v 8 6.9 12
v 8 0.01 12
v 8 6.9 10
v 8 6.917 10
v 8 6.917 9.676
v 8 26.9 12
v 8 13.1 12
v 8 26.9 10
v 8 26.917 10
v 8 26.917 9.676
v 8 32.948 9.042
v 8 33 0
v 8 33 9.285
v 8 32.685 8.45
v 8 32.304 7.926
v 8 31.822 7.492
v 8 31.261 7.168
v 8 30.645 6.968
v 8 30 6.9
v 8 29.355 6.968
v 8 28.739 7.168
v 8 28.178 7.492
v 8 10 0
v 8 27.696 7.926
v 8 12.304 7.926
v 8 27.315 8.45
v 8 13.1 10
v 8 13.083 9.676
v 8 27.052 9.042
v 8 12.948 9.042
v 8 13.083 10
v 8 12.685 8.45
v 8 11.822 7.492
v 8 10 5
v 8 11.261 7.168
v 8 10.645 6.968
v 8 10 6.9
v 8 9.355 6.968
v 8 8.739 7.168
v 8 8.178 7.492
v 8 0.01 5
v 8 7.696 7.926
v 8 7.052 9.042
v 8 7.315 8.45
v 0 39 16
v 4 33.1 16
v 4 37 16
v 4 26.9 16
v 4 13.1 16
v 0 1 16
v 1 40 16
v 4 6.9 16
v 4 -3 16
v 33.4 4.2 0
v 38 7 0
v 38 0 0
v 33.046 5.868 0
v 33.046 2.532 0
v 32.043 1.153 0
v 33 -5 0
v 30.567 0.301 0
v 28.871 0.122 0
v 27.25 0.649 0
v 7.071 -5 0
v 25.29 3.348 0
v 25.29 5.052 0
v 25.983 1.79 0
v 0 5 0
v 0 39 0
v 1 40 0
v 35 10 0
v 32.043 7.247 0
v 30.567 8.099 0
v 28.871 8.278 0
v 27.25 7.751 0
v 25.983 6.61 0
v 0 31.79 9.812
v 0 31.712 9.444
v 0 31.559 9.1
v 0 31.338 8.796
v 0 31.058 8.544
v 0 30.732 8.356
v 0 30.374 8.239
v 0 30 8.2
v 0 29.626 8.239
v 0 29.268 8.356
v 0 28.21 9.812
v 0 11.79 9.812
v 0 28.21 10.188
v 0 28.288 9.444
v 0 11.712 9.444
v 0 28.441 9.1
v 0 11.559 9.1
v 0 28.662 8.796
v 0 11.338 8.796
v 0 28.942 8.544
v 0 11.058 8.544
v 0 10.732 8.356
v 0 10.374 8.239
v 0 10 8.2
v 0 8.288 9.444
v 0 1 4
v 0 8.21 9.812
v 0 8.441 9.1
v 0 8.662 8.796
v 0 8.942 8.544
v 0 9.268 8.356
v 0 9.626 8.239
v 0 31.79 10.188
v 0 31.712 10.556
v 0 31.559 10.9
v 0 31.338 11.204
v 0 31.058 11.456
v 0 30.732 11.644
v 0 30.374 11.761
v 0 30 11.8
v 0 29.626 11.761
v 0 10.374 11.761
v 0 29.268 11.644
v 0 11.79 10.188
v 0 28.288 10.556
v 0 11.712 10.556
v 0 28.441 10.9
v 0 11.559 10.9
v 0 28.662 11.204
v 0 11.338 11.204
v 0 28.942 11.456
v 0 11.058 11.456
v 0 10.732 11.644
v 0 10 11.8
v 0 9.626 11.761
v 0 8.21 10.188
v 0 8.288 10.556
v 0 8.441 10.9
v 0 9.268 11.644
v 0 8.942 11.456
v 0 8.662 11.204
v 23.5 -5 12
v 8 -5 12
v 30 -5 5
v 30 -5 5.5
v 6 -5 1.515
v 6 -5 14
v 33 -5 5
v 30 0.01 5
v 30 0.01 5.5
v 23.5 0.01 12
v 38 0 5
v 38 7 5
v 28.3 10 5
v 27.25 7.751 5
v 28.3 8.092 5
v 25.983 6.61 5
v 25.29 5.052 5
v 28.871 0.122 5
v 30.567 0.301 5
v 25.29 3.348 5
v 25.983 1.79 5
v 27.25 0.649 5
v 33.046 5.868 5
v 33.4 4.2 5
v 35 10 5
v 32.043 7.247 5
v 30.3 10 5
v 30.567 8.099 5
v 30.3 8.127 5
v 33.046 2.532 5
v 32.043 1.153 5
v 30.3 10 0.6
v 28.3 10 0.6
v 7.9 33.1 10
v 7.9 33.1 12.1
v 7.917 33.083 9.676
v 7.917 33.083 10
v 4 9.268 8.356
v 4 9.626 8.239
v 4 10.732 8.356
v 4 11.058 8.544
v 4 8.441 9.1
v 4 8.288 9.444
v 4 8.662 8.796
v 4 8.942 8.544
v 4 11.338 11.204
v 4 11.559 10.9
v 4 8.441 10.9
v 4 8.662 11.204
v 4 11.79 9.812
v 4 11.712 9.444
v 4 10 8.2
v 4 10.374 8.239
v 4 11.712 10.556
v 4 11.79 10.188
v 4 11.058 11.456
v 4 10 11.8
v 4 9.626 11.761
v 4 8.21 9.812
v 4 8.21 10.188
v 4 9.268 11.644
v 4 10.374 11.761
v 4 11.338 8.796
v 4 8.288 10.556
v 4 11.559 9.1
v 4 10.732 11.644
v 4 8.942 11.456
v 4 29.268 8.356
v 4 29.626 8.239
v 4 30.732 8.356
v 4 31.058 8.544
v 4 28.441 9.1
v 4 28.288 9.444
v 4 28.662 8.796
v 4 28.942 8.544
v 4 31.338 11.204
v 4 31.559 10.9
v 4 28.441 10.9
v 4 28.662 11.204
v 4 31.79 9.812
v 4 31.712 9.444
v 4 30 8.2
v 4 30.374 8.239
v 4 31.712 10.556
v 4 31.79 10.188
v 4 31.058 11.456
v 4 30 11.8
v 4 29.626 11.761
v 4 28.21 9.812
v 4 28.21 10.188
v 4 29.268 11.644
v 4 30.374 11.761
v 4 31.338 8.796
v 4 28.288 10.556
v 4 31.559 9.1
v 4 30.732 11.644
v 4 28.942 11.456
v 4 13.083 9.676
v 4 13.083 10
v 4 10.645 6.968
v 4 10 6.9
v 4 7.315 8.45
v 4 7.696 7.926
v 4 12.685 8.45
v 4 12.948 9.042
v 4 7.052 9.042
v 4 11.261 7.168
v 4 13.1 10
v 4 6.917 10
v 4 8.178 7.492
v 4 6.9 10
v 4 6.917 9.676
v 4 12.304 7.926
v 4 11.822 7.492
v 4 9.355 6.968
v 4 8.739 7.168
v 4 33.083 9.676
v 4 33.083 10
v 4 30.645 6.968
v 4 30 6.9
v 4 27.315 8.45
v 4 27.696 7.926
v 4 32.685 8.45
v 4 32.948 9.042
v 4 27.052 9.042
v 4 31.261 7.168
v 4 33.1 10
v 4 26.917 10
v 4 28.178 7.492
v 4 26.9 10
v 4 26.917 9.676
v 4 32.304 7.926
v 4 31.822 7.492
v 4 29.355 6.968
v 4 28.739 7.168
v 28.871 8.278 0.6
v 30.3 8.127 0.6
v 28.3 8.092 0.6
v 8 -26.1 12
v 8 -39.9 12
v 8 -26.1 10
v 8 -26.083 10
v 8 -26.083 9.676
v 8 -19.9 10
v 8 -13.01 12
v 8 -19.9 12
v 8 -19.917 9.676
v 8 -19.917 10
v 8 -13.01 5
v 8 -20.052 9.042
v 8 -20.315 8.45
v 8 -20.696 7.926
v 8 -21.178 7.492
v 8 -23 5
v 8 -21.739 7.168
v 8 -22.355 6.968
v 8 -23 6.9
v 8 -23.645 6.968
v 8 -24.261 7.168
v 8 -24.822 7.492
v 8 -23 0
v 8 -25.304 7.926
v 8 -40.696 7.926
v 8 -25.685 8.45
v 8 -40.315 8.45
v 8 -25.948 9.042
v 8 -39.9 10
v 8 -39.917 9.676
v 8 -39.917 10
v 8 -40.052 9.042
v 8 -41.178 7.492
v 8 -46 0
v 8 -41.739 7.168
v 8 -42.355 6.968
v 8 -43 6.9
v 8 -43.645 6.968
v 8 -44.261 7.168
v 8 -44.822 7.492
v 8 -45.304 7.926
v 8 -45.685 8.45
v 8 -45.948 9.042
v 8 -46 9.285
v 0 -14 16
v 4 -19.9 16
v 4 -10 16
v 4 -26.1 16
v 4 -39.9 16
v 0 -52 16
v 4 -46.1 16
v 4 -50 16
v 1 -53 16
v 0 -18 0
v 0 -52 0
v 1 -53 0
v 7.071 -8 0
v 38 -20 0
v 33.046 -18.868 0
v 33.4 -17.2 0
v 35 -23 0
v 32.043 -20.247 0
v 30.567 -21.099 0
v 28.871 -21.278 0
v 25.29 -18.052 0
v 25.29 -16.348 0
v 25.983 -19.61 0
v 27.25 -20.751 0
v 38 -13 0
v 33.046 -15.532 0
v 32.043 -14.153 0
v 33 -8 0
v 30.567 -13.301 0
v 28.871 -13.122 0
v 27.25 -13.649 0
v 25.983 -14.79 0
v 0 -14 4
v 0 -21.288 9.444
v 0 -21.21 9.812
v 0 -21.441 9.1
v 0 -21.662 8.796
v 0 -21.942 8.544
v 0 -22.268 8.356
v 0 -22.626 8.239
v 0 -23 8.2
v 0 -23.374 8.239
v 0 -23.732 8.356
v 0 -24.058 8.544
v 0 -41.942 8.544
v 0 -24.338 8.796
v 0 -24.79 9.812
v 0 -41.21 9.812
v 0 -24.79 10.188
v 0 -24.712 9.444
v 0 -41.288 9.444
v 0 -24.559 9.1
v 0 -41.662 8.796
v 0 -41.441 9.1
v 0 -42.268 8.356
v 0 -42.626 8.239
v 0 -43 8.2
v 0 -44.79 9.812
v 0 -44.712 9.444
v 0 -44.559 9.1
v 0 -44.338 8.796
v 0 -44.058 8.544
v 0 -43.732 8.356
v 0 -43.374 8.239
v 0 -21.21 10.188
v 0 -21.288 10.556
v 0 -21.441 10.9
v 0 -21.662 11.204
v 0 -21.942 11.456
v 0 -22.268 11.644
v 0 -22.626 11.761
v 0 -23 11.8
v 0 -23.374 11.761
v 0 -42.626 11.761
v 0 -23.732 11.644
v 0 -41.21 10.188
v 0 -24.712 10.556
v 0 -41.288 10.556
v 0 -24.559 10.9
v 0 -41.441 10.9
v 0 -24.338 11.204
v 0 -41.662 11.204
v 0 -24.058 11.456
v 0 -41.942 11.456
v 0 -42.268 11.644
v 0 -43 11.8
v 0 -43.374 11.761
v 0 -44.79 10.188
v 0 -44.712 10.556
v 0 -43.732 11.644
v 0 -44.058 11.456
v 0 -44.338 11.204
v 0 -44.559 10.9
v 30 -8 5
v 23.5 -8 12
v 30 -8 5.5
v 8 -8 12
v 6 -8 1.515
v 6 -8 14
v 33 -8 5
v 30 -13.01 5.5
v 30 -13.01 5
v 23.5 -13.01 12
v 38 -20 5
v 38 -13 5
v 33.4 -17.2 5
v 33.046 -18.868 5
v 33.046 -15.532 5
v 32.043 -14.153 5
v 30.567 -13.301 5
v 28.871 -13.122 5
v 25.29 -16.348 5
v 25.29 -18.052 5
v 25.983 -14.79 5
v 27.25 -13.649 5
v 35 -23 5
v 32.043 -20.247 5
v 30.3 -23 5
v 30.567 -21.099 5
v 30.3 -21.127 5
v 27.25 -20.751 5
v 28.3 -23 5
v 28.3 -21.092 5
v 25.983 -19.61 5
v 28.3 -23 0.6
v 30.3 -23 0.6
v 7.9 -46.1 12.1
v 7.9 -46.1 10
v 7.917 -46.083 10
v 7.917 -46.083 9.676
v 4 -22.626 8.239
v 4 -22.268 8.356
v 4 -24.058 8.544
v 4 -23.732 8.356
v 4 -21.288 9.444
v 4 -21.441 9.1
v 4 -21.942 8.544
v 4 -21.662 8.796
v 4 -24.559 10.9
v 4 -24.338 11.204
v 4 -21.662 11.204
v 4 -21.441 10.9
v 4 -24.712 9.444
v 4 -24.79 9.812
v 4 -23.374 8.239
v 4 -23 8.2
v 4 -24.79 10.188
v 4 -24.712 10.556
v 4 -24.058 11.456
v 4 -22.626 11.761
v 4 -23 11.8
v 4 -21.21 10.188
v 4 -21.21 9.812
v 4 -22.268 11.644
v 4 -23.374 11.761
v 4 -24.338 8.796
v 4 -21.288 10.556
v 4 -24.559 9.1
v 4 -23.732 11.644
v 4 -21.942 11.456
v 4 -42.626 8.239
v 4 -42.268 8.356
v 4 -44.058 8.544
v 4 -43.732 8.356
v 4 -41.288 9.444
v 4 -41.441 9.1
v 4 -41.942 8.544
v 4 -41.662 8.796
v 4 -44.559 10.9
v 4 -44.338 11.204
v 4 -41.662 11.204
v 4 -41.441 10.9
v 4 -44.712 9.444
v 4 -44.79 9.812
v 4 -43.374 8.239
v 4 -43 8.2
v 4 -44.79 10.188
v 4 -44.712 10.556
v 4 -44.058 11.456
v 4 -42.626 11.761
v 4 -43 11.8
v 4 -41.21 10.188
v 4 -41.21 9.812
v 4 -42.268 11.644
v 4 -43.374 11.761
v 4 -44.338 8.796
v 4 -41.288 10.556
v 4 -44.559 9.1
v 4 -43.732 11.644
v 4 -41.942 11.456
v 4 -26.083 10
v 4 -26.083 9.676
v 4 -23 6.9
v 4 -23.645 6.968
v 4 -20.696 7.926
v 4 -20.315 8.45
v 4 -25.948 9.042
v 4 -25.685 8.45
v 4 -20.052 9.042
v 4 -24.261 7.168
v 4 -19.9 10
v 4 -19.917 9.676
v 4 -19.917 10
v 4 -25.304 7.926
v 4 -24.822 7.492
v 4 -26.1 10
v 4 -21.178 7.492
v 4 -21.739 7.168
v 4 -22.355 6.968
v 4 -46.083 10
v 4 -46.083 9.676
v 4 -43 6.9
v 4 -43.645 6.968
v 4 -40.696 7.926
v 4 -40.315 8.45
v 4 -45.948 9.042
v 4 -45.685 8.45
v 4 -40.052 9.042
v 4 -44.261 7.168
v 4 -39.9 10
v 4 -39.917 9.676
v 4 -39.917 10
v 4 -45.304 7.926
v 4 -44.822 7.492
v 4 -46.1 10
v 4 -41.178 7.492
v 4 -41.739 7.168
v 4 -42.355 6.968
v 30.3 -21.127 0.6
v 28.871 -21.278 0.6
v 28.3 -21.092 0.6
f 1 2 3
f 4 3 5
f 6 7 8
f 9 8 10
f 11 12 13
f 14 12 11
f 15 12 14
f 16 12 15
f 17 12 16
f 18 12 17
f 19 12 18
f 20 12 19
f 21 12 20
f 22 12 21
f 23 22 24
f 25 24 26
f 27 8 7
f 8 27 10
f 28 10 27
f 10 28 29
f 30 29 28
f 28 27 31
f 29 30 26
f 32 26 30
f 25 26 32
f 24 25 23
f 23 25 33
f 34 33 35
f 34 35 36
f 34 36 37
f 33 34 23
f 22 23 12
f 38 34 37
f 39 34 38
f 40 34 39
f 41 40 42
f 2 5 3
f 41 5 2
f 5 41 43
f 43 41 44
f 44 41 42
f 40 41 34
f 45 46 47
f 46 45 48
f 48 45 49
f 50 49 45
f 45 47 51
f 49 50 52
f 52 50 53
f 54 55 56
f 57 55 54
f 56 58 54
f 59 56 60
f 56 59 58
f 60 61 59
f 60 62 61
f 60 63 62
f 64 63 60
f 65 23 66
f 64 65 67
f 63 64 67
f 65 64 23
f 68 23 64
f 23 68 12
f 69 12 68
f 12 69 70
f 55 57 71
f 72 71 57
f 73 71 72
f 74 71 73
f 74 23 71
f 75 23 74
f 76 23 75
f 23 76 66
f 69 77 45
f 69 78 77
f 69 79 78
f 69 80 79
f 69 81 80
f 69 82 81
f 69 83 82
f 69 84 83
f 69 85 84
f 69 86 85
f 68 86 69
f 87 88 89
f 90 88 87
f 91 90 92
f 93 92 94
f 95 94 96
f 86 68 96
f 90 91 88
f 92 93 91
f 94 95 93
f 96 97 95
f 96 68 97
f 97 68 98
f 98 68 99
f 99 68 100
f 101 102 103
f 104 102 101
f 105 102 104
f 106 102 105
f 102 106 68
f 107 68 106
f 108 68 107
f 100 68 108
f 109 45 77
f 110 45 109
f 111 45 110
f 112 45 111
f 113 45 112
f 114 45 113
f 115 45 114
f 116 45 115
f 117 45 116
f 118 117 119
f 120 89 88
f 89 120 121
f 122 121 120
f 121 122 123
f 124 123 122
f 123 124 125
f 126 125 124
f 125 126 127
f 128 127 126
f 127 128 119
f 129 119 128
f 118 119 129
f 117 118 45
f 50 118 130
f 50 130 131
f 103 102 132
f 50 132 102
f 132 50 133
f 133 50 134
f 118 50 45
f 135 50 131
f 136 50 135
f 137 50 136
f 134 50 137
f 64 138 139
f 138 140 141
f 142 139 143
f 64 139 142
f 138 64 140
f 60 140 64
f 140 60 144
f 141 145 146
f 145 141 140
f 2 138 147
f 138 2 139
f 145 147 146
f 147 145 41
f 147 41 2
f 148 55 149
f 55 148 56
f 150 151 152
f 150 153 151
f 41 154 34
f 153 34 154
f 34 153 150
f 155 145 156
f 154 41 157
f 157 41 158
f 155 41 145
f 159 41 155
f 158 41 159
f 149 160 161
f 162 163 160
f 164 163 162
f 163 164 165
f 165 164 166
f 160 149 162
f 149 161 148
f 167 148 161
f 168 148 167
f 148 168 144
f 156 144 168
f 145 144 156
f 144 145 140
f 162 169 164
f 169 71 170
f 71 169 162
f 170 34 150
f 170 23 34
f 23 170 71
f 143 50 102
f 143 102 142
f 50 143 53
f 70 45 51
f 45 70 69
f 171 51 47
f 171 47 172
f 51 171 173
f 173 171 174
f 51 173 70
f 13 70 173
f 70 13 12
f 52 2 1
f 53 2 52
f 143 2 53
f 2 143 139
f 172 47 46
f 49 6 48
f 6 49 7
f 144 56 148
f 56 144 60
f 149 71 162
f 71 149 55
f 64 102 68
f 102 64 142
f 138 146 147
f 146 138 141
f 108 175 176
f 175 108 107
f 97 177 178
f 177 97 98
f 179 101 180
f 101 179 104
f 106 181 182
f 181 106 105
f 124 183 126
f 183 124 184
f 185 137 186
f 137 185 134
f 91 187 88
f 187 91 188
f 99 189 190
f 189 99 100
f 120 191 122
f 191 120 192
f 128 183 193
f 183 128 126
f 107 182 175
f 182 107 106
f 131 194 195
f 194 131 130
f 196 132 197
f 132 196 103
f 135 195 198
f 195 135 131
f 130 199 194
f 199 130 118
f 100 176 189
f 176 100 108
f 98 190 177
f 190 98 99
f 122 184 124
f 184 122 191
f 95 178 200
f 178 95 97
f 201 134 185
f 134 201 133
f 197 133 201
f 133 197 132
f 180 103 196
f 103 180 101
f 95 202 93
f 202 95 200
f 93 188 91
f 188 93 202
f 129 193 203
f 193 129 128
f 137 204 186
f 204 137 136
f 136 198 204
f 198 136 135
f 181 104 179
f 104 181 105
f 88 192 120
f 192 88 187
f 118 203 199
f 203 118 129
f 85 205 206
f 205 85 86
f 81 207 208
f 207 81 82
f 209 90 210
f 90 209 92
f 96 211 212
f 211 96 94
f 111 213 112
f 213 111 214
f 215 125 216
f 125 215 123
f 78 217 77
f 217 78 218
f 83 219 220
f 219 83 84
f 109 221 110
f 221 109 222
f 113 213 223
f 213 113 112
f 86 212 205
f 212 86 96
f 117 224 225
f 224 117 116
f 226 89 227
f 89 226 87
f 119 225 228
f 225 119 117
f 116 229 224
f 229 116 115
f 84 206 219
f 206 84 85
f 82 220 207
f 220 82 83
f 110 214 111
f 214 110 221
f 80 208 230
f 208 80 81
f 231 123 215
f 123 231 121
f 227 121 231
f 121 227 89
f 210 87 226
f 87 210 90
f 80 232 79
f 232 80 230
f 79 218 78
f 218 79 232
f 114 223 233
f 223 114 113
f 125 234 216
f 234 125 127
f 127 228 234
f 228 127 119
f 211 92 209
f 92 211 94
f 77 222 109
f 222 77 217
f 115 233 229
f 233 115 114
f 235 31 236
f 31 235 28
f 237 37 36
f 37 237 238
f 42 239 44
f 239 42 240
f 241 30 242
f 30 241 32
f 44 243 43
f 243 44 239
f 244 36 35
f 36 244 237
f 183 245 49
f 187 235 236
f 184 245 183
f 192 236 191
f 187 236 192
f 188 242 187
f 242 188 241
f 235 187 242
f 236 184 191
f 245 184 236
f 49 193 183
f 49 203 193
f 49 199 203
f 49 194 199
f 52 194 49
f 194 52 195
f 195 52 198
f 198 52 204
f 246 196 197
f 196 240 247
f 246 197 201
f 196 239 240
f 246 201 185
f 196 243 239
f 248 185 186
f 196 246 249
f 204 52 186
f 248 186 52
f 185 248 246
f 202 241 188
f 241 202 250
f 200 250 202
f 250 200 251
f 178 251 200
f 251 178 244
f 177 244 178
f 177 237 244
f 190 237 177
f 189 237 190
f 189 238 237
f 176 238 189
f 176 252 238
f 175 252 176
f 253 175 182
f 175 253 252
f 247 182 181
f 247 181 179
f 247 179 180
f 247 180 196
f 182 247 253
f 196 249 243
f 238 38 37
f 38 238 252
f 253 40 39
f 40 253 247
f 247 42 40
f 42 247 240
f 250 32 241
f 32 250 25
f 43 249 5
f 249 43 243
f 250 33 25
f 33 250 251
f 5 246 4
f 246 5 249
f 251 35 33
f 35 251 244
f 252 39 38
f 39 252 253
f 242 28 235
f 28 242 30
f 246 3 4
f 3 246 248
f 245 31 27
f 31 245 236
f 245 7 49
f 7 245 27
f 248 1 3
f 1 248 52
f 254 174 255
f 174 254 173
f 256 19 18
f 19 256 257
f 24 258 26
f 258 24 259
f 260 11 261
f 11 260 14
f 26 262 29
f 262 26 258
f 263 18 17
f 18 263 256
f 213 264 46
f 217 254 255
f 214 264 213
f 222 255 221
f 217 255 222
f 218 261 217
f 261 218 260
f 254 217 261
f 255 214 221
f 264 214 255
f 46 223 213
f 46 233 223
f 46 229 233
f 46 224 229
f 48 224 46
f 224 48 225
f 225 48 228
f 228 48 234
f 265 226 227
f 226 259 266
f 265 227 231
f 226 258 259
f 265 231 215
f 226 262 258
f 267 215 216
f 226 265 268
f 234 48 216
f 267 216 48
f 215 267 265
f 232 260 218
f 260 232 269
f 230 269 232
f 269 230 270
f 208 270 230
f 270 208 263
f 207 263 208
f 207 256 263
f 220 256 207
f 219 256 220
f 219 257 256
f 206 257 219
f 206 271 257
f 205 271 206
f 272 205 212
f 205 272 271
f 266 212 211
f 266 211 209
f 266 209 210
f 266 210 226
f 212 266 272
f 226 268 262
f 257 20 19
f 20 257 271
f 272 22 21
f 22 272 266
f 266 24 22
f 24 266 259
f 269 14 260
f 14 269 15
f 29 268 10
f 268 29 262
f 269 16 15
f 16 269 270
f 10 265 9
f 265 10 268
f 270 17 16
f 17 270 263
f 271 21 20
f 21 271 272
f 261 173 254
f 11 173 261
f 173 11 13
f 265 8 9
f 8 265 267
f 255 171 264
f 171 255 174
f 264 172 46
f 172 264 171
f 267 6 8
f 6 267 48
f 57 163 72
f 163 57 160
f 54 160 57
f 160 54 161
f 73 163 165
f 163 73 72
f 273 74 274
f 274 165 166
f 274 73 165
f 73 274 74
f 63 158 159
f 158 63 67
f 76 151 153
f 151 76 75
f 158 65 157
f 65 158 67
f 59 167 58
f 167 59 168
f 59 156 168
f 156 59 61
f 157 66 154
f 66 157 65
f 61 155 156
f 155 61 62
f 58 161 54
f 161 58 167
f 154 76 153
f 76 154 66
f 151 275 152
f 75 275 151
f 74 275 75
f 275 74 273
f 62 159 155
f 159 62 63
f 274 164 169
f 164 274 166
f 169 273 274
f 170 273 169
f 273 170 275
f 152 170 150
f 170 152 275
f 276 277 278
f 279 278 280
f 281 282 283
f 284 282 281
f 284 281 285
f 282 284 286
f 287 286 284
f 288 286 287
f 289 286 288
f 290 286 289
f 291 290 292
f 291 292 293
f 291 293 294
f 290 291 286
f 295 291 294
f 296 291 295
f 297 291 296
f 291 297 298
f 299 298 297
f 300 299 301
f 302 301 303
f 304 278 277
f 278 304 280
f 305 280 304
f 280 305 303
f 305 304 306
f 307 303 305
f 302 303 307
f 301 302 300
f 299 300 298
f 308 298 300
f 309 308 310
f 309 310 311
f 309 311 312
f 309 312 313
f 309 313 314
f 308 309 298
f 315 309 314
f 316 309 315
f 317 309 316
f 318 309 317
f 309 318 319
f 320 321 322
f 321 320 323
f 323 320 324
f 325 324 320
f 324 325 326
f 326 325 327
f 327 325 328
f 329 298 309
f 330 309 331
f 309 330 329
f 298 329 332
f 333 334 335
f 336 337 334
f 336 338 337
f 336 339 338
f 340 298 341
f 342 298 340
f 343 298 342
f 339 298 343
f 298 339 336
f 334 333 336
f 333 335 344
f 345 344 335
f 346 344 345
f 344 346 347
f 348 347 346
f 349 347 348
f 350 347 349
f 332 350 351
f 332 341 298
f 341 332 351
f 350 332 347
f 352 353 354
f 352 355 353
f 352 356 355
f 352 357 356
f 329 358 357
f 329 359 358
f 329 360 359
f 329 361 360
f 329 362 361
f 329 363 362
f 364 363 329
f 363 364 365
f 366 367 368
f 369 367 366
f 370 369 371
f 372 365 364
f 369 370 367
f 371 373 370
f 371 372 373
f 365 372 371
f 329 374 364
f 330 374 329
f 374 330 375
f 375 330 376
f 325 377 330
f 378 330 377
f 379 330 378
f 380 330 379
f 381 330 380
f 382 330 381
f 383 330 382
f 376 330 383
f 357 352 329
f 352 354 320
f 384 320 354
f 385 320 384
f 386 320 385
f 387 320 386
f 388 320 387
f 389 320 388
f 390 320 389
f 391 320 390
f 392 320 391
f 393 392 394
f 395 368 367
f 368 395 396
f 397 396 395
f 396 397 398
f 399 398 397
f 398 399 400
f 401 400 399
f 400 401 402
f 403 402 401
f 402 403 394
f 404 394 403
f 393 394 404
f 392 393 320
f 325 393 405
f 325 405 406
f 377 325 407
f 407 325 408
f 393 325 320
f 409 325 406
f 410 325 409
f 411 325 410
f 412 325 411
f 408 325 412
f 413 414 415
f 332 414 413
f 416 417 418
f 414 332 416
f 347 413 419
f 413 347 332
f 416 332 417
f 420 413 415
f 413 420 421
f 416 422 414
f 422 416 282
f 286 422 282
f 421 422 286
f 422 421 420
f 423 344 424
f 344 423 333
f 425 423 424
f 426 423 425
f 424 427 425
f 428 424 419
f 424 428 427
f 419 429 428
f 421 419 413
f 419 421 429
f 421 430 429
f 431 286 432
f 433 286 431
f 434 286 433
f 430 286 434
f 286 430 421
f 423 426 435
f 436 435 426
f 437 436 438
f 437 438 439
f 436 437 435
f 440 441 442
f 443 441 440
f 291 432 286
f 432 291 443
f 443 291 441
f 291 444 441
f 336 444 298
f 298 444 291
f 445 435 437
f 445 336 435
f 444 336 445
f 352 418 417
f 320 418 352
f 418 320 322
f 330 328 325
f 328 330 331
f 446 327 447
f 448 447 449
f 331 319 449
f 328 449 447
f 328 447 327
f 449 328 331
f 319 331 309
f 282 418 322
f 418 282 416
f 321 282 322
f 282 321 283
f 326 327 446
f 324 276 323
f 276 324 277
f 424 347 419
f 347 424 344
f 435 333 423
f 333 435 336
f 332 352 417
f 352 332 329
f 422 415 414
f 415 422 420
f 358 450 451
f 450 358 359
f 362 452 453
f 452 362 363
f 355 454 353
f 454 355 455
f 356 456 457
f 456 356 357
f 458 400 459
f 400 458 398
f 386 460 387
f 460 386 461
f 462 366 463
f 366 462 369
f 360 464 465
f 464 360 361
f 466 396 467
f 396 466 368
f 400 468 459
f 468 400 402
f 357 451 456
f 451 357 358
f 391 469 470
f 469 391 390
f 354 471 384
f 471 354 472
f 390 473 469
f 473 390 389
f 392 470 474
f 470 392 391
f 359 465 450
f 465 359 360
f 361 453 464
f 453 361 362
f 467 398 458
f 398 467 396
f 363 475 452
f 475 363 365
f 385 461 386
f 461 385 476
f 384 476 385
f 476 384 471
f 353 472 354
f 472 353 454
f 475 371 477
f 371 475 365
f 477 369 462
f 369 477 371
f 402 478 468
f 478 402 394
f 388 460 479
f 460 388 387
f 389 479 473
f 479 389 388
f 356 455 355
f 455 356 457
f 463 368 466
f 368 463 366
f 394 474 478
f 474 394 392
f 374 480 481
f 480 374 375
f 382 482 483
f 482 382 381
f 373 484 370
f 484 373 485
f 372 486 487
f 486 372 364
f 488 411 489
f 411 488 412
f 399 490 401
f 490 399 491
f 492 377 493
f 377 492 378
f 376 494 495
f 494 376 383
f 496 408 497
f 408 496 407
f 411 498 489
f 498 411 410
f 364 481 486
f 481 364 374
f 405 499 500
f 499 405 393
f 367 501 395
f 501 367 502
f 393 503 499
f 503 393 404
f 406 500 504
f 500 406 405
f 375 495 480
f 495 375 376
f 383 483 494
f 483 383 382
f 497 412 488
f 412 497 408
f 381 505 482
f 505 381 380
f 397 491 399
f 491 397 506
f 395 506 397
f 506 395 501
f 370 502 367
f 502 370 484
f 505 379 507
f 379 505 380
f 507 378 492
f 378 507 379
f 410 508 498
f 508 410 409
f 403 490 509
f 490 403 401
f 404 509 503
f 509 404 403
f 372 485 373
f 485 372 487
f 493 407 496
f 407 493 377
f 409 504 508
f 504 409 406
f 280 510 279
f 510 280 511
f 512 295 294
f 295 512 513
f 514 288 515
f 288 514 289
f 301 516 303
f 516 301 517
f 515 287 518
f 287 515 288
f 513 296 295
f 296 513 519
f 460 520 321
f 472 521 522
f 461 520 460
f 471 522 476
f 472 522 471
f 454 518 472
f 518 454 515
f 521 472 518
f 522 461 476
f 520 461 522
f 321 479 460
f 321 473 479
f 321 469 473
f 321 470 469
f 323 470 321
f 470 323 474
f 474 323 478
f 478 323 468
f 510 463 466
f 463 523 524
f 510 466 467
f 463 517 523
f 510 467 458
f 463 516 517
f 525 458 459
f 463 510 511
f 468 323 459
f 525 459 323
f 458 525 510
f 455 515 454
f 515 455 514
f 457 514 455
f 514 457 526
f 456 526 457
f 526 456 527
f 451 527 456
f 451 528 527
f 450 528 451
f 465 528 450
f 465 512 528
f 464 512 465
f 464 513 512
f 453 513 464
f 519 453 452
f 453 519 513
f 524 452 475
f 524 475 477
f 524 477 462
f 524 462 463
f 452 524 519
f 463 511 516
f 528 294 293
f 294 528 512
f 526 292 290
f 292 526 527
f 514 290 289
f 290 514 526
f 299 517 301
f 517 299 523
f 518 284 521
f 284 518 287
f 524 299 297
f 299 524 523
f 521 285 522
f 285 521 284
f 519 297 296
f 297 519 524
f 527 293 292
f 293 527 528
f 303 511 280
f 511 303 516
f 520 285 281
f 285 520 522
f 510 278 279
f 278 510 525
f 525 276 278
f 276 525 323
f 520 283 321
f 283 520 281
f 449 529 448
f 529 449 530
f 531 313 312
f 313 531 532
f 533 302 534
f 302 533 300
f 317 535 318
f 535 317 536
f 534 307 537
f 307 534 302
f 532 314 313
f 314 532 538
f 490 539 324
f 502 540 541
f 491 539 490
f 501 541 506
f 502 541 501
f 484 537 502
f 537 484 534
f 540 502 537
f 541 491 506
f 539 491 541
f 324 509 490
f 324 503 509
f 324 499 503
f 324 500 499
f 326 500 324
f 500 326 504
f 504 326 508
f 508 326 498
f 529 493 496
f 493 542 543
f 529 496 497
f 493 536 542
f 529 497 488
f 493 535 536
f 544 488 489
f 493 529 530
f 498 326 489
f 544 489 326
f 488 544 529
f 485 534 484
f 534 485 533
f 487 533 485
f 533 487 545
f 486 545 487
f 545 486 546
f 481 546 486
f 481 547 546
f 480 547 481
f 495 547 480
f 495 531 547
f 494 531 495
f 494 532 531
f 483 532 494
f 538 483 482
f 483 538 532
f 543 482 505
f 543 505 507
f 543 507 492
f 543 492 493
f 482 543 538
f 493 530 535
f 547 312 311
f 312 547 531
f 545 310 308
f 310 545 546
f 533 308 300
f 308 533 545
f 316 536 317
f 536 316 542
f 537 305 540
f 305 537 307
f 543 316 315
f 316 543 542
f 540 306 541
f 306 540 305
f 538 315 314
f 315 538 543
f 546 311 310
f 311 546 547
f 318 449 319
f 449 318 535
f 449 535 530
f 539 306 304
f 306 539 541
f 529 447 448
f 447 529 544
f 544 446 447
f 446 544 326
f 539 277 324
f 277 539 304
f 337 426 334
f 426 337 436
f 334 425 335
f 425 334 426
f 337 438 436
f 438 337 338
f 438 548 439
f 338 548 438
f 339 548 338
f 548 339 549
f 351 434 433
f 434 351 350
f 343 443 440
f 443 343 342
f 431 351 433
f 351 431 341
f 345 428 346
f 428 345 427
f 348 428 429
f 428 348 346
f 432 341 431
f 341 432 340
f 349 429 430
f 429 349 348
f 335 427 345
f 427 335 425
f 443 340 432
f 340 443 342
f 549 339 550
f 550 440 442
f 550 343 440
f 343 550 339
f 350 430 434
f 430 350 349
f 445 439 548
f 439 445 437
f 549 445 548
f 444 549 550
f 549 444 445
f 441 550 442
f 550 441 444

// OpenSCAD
// PRUSA iteration3
// Z axis top holder
// GNU GPL v3
// Josef Průša <iam@josefprusa.cz> and contributors
// http://www.reprap.org/wiki/Prusa_Mendel
// http://prusamendel.org

module z_top_base(){
 translate([0,-5,0]) cube([8,45,16]); // plate touching the base
 translate([0,-5,0]) cube([30,5.01,12]); // plate touching the base
 translate([0,-5,0]) cube([38,15,5]); // plate touching the base
}

module z_top_fancy(){
 // Corner cutouts
 translate([0.5,0.5,0]) rotate([0,0,-45-180]) translate([-15,0,-1]) cube([30,30,51]);
 translate([0.5,40-0.5,0]) rotate([0,0,-45+90]) translate([-15,0,-1]) cube([30,30,51]);
 translate([-4,40+5,0]) rotate([0,0,-45-0]) translate([0,0,-1]) cube([30,30,51]);
 translate([8,0,12]) rotate([0,-45,0]) translate([0,-5,0]) cube([30,50,30]);
 translate([38-2.5,-5+2.5,0]) rotate([0,0,-45-90]) translate([-15,0,-1]) cube([30,30,51]);
 translate([38-1.5,10-1.5,0]) rotate([0,0,-45]) translate([-15,0,-1]) cube([30,30,51]);
 translate([0,0,5]) rotate([45+180,0,0]) rotate([0,0,-45+90]) translate([0,0,-15]) cube([30,30,30]);

 // Stiffner cut out
 translate([30,0,5.5]) rotate([0,-45,0]) translate([0,-5,0]) cube([30,50,30]);
}

module z_top_holes(){
 // Screw holes
 translate([-1,10,10]) rotate([0,90,0]) cylinder(h = 20, r=1.8, $fn=30);
 translate([-1,10+20,10]) rotate([0,90,0]) cylinder(h = 20, r=1.8, $fn=30);

 // Screw heads
 translate([4,10,10]) rotate([0,90,0]) cylinder(h = 20, r=3.1, $fn=30);
 translate([4,10-3.1,10]) cube([10,6.2,10]);
 translate([4,10+20,10]) rotate([0,90,0]) cylinder(h = 20, r=3.1, $fn=30);
 translate([4,10+20-3.1,10]) cube([10,6.2,10]);

 // Z rod holder
 translate([25+4.3,4.2,-1]) rotate([0,0,0]) cylinder(h = 50, r=4.1, $fn=15);
 translate([25+4.3-1,3,0.6]) cube([2,10,7]); // it's bit up because it helps with printing
}

// Final part
module z_top(){
 difference(){
  z_top_base();
  z_top_fancy();
  z_top_holes();
 }
 translate([0,-13,0]) mirror([0,1,0]) difference(){
  z_top_base();
  z_top_fancy();
  z_top_holes();
 }
}

z_top();
